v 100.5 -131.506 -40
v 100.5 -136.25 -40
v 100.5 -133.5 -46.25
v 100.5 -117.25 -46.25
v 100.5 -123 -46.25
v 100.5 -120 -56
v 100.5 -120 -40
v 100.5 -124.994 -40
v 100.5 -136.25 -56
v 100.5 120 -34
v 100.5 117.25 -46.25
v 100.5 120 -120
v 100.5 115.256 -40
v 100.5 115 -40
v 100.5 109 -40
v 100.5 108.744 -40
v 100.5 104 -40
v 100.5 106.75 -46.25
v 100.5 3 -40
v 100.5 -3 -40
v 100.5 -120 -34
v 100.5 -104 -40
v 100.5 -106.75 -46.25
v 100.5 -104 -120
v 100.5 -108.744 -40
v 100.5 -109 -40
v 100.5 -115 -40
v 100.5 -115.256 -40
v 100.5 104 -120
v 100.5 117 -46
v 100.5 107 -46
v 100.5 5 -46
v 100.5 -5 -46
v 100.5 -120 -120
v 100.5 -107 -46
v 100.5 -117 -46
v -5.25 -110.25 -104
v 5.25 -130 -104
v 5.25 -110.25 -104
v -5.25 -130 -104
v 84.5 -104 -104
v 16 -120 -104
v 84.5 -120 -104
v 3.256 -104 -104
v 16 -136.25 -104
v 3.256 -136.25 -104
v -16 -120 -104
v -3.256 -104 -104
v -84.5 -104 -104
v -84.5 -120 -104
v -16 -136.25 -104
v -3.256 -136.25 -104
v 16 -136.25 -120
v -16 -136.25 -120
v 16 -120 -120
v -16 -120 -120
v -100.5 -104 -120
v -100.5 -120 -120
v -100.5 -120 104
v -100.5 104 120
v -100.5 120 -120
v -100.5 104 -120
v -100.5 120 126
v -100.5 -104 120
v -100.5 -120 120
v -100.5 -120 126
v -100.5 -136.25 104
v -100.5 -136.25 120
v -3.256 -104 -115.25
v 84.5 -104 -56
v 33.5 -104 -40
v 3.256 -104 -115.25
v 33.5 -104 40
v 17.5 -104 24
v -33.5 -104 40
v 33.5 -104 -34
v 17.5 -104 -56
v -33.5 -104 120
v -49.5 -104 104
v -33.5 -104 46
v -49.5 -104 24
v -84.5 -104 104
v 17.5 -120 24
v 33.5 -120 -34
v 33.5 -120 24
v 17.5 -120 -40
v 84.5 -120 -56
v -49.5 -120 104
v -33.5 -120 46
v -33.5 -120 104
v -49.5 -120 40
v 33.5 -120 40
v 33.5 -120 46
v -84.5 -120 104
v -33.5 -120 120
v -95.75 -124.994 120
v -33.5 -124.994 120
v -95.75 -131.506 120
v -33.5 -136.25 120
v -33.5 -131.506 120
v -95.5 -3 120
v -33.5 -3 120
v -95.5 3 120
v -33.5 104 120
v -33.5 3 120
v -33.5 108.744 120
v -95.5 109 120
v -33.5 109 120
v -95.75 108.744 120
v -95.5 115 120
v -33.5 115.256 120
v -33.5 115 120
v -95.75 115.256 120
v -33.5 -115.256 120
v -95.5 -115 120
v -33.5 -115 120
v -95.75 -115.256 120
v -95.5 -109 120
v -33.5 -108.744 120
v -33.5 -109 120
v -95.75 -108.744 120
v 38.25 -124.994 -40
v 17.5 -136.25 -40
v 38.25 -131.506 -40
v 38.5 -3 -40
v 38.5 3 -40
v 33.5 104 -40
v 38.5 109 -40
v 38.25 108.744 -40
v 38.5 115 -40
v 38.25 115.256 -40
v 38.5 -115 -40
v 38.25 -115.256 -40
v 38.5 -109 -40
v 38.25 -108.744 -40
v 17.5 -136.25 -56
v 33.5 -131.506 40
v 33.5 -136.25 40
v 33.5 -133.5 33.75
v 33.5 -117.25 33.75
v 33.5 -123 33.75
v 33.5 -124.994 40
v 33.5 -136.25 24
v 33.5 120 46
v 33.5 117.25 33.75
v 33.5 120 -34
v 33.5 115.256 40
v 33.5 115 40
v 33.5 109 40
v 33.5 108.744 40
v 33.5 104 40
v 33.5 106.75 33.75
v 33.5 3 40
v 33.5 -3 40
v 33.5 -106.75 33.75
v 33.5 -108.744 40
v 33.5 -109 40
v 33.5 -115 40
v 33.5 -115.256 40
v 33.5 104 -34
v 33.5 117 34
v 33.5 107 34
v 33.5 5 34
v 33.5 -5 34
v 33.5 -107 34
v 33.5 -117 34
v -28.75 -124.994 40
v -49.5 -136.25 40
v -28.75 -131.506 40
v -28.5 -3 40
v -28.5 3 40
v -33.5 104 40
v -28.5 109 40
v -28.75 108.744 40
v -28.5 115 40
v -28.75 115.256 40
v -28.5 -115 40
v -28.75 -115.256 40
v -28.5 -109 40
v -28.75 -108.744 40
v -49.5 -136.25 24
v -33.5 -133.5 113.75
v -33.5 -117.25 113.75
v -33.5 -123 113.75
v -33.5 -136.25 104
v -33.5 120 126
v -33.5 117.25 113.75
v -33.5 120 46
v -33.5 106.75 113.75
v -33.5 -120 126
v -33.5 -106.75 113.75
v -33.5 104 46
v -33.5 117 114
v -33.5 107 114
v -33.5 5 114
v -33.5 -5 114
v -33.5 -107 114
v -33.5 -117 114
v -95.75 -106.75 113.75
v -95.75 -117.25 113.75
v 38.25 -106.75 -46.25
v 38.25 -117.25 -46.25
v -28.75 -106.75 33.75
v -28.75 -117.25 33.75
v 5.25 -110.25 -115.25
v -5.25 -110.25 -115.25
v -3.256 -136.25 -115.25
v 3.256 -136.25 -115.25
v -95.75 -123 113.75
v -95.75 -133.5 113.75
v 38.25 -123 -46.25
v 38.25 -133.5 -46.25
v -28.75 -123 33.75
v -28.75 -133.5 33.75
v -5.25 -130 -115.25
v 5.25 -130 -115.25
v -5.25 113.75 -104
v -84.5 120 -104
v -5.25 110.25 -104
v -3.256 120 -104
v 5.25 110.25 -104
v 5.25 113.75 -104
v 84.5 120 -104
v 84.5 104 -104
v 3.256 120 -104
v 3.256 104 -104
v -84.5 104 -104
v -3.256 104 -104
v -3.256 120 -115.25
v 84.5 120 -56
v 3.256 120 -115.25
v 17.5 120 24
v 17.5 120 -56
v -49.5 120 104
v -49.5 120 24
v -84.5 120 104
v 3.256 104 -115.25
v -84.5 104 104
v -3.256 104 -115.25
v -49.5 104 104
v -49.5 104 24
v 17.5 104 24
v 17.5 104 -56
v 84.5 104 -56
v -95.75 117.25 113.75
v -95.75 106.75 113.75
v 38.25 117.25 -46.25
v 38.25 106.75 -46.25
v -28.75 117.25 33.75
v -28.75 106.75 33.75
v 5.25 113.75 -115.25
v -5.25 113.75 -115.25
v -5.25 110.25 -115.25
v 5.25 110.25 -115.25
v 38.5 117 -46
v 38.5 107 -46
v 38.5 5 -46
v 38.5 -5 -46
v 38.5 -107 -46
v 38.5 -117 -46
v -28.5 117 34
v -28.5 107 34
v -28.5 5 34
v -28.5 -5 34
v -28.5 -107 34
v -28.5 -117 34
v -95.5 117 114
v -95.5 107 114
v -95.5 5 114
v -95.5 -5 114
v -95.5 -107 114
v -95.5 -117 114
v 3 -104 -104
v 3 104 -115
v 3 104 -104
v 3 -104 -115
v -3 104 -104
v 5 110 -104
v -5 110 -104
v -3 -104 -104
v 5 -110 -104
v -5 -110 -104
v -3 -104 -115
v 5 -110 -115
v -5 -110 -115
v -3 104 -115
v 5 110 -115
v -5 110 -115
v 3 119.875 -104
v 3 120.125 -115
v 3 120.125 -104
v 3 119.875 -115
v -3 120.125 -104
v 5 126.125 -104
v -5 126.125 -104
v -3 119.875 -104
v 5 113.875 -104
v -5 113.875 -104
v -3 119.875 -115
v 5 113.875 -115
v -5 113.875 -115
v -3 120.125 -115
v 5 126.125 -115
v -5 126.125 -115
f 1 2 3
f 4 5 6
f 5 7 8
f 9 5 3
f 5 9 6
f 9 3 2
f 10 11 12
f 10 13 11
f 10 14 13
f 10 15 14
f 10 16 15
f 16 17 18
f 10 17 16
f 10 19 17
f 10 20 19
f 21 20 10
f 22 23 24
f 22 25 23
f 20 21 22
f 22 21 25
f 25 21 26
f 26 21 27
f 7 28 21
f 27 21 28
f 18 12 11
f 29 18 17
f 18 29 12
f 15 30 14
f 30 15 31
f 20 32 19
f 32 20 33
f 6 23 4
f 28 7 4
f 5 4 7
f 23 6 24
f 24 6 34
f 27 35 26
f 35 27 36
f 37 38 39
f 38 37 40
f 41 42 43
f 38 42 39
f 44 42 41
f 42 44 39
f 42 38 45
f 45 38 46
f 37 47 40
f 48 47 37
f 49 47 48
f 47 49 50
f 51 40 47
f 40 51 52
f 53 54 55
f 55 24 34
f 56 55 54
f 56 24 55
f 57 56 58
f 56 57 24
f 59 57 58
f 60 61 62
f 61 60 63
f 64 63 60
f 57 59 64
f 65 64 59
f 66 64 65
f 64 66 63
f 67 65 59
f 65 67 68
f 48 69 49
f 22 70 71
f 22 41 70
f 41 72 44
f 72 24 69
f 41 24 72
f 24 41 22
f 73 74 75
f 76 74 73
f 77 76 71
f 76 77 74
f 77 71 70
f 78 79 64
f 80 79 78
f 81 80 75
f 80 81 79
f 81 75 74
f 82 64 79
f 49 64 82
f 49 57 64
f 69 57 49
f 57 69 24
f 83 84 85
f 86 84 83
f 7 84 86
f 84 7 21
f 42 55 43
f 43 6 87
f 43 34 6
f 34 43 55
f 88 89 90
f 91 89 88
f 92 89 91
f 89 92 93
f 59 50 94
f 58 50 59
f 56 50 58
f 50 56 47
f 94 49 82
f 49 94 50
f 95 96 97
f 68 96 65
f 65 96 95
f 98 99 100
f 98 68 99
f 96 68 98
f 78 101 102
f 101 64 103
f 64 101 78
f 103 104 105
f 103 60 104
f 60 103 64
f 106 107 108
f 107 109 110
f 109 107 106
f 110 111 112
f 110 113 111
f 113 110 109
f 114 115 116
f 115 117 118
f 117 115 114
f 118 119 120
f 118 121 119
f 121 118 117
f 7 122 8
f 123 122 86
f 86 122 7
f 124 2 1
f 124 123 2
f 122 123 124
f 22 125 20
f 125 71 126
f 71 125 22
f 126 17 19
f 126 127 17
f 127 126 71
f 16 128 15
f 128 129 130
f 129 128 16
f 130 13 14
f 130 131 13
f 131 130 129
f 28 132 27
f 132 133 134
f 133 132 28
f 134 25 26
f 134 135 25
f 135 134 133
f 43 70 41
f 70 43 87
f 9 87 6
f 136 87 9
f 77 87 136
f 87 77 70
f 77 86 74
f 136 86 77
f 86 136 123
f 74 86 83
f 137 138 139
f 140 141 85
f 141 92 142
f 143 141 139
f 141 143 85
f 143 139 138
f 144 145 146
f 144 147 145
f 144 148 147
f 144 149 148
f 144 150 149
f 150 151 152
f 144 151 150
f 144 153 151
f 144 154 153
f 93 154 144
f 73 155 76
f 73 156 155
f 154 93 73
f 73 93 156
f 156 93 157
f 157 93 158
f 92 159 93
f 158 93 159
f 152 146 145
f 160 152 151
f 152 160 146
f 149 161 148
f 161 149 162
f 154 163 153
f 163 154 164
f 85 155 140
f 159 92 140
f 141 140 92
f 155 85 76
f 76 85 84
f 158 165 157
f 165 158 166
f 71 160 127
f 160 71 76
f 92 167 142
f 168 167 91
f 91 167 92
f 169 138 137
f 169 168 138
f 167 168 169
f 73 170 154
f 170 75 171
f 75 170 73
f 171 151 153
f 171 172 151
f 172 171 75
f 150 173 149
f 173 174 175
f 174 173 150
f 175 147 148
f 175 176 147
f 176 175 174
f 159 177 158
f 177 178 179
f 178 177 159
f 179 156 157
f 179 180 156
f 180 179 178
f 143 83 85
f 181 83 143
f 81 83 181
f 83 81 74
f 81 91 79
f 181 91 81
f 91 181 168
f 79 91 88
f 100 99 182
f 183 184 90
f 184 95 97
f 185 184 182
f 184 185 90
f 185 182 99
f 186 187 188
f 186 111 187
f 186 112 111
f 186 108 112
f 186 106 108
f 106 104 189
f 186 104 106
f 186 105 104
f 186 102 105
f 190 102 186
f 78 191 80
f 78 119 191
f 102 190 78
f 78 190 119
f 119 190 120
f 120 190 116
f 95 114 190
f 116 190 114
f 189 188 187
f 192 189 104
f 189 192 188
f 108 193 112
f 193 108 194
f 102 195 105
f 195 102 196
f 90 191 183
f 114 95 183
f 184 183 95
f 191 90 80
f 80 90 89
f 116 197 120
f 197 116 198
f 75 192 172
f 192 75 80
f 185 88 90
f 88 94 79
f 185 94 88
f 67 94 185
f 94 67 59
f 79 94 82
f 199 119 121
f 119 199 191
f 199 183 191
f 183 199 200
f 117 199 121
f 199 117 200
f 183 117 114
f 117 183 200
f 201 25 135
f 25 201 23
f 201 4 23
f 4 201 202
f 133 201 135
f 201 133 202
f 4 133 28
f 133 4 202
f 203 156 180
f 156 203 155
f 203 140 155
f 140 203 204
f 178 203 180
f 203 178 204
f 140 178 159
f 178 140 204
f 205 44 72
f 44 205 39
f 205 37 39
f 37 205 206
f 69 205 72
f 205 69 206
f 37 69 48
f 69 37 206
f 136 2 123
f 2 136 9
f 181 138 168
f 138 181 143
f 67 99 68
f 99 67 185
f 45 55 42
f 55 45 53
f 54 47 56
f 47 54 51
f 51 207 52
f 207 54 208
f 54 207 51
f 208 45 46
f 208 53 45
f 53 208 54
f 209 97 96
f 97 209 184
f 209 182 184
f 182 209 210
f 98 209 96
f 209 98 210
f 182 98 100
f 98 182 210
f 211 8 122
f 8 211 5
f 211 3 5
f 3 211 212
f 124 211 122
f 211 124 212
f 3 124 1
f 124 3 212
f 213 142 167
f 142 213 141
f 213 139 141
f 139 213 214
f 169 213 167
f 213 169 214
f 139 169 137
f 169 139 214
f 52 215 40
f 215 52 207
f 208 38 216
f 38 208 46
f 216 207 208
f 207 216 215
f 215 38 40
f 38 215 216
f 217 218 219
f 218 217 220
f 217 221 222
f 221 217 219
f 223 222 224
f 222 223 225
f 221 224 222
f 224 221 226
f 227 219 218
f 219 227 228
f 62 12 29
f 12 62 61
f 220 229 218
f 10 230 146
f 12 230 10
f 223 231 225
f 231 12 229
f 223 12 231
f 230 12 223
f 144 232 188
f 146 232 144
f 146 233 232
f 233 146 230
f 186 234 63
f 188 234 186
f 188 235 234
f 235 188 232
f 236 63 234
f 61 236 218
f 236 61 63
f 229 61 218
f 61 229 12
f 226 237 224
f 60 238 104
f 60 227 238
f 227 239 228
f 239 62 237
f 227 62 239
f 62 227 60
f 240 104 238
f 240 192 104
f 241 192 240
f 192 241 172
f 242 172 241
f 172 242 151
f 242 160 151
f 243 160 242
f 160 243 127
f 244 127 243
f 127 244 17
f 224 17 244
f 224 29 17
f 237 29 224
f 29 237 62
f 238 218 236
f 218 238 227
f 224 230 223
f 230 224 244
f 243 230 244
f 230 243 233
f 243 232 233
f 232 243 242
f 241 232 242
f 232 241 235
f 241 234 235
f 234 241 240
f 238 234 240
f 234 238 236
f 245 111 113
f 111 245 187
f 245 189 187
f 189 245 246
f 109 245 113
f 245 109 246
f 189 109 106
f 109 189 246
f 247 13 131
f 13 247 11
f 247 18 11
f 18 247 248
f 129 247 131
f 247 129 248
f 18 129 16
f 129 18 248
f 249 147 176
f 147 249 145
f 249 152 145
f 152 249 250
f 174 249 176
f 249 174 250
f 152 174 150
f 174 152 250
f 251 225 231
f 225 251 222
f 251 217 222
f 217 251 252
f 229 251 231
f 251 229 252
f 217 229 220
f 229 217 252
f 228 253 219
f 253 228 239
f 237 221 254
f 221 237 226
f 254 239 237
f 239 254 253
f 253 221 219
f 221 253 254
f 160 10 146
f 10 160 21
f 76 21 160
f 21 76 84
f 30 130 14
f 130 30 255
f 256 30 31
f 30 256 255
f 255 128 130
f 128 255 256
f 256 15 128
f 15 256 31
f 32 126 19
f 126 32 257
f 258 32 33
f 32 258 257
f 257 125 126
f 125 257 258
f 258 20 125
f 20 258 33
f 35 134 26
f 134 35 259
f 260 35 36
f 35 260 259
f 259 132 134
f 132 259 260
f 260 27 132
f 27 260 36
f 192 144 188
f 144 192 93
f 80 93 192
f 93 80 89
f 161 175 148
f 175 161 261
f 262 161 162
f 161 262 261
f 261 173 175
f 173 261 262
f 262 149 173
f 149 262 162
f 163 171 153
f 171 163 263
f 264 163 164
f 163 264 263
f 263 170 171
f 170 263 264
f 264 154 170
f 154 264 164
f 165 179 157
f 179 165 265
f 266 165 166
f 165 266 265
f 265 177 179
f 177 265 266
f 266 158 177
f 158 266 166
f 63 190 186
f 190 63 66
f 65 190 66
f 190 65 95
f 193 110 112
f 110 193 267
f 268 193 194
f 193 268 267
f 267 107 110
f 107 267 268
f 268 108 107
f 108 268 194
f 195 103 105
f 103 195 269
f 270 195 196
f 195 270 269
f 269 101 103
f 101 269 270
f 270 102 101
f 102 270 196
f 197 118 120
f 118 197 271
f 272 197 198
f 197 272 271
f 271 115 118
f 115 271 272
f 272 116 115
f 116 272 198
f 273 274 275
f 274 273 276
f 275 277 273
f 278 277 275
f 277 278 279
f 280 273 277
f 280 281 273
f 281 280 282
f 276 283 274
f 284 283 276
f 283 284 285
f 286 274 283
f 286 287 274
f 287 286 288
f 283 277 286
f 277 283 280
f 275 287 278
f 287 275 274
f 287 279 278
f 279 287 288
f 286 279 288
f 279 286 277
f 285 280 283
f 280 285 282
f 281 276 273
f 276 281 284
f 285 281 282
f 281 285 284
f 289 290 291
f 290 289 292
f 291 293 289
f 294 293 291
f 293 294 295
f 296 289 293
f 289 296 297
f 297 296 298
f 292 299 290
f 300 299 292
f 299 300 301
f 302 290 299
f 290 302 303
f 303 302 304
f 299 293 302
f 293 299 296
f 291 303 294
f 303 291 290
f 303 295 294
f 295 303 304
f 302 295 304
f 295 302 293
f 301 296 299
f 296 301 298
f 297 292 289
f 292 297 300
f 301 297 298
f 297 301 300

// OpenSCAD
// file: wall.scad
include <common.scad>
include <config.scad>

wall_total_l = shelf_d * 3;
wall_total_h = shelf_h_sep * 3;

module wall_common()
{
	difference()
	{
		union()
		{
			/* main horizontal */
			translate([0, 0, -(wall_total_h / 2) + (wall_t / 2)])
				color(color_wall)
					cube([wall_total_l, wall_t, wall_t], center=true);

			/* main vertical */
			translate([-(wall_total_l / 2) + (wall_t / 2), 0, 0])
				color(color_wall)
					cube([wall_t, wall_t, wall_total_h], center=true);

			/* shelf 1 vertical */
			translate([(wall_total_l / 2) - (wall_t / 2), 0, -(shelf_h_sep)])
				color(color_wall)
					cube([wall_t, wall_t, shelf_h_sep], center=true);

			/* shelf 1 horizontal */
			translate([(wall_total_l / 2) - ((shelf_d + wall_t) / 2), 0, -(shelf_h_sep / 2) - (wall_t / 2)])
				color(color_wall)
					cube([shelf_d + wall_t, wall_t, wall_t], center=true);

			/* shelf 2 vertical */
			translate([(shelf_d / 2) - (wall_t / 2), 0, 0])
				color(color_wall)
					cube([wall_t, wall_t, shelf_h_sep], center=true);

			/* shelf 2 horizontal */
			translate([-(wall_t / 2), 0, (shelf_h_sep / 2) - (wall_t / 2)])
				color(color_wall)
					cube([shelf_d + wall_t, wall_t, wall_t], center=true);

			/* shelf 3 vertical */
			translate([-(shelf_d / 2) - (wall_t / 2), 0, +(shelf_h_sep)])
				color(color_wall)
					cube([wall_t, wall_t, shelf_h_sep], center=true);

			/* shelf 3 horizontal */
			translate([-shelf_d, 0, (wall_total_h / 2) - (wall_t / 2)])
				color(color_wall)
					cube([shelf_d, wall_t, wall_t], center=true);
		}

		/* Shelf 1 dovetail */
		translate([
			-(shelf_d / 2) + eps,
			0,
			(wall_total_h / 2) + eps
		])
			rotate([0, 0, 90])
				color(color_test)
					dovetail(
						length = shelf_dovetail_len + clearance + eps,
						depth = joint_depth + clearance + eps,
						neck = joint_neck + 2 * clearance,
						head = joint_head + 2 * clearance
					);

		/* Shelf 2 dovetail */
		translate([
			(shelf_d * 3 / 2) + eps,
			0,
			-(shelf_h_sep / 2) + eps
		])
			rotate([0, 0, 90])
				color(color_test)
					dovetail(
						length = shelf_dovetail_len + clearance + eps,
						depth = joint_depth + clearance + eps,
						neck = joint_neck + 2 * clearance,
						head = joint_head + 2 * clearance
					);

		/* Shelf 3 dovetail */
		translate([
			(shelf_d / 2) + eps,
			0,
			(shelf_h_sep / 2) + eps
		])
			rotate([0, 0, 90])
				color(color_test)
					dovetail(
						length = shelf_dovetail_len + clearance + eps,
						depth = joint_depth + clearance + eps,
						neck = joint_neck + 2 * clearance,
						head = joint_head + 2 * clearance
					);

		/* Base dovetail 1 */
		translate([
			0,
			(wall_t / 2) + eps,
			-(wall_total_h / 2) + wall_t + eps
		])
			rotate([270, 0, 0])
				color(color_test)
					dovetail(
						length = wall_dovetail_len + clearance + eps,
						depth = joint_depth + clearance + eps,
						neck = joint_neck + 2 * clearance,
						head = joint_head + 2 * clearance
					);
	}
}

module wall()
{
	difference()
	{
		/* Wall */
		wall_common();

		/* Base dovetail 2 */
		translate([
			0,
			-(wall_t / 2) - eps,
			-(wall_total_h / 2) + wall_t + eps
		])
			rotate([90, 180, 0])
				color(color_test)
					dovetail(
						length = wall_dovetail_len + clearance + eps,
						depth = joint_depth + clearance + eps,
						neck = joint_neck + 2 * clearance,
						head = joint_head + 2 * clearance
					);
	}
}


module wall_middle()
{
	shelf_y = -(wall_t + (clearance / 2));

	difference()
	{
		union()
		{
			wall_common();

			/* shelf 1 horizontal */
			translate([(wall_total_l / 2) - ((shelf_d + wall_t) / 2), shelf_y, -(shelf_h_sep / 2) - (wall_t / 2)])
				color(color_wall)
					cube([shelf_d + wall_t, wall_t + clearance, wall_t], center=true);

			/* shelf 2 horizontal */
			translate([-(wall_t / 2), shelf_y, (shelf_h_sep / 2) - (wall_t / 2)])
				color(color_wall)
					cube([shelf_d + wall_t, wall_t + clearance, wall_t], center=true);

			/* shelf 3 horizontal */
			translate([-shelf_d, shelf_y, (wall_total_h / 2) - (wall_t / 2)])
				color(color_wall)
					cube([shelf_d, wall_t + clearance, wall_t], center=true);

			/* Base 2 */
			translate([0, -wall_t, -(wall_total_h / 2) + (wall_t / 2)])
				color(color_wall)
					cube([wall_t * 2, wall_t + (clearance * 2), wall_t], center=true);
		}

		/* Shelf 1 dovetail */
		translate([
			-(shelf_d / 2) + eps,
			-(wall_t + clearance),
			(wall_total_h / 2) + eps
		])
			rotate([0, 0, 90])
				color(color_test)
					dovetail(
						length = shelf_dovetail_len + clearance + eps,
						depth = joint_depth + clearance + eps,
						neck = joint_neck + 2 * clearance,
						head = joint_head + 2 * clearance
					);

		/* Shelf 2 dovetail */
		translate([
			(shelf_d * 3 / 2) + eps,
			-(wall_t + clearance),
			-(shelf_h_sep / 2) + eps
		])
			rotate([0, 0, 90])
				color(color_test)
					dovetail(
						length = shelf_dovetail_len + clearance + eps,
						depth = joint_depth + clearance + eps,
						neck = joint_neck + 2 * clearance,
						head = joint_head + 2 * clearance
					);

		/* Shelf 3 dovetail */
		translate([
			(shelf_d / 2) + eps,
			-(wall_t + clearance),
			(shelf_h_sep / 2) + eps
		])
			rotate([0, 0, 90])
				color(color_test)
					dovetail(
						length = shelf_dovetail_len + clearance + eps,
						depth = joint_depth + clearance + eps,
						neck = joint_neck + 2 * clearance,
						head = joint_head + 2 * clearance
					);

		/* Base dovetail 2 */
		translate([
			0,
			-(wall_t + clearance) -(wall_t / 2) - eps,
			-(wall_total_h / 2) + wall_t + eps
		])
			rotate([90, 180, 0])
				color(color_test)
					dovetail(
						length = wall_dovetail_len + clearance + eps,
						depth = joint_depth + clearance + eps,
						neck = joint_neck + 2 * clearance,
						head = joint_head + 2 * clearance
					);
	}
}
// file: shelf.scad
include <common.scad>
include <config.scad>

module shelf()
{
	c_l = shelf_d;
	c_w = shelf_w;
	c_h = shelf_t;

	joint_x = shelf_w / 2 - wall_t / 2;
	joint_y = - shelf_d / 2;
	joint_z = - shelf_t / 2;

	union()
	{
		color(color_shelf)
			cube([c_l, c_w, c_h], center=true);

		color(color_dovetail)
			rotate([0, 0, 90])
				translate([joint_x, joint_y, joint_z])
					dovetail(
						length = shelf_dovetail_len,
						depth = joint_depth,
						neck = joint_neck,
						head = joint_head
					);

		color(color_dovetail)
			rotate([0, 0, 90])
				translate([0, joint_y, joint_z])
					dovetail(
						length = shelf_dovetail_len,
						depth = joint_depth,
						neck = joint_neck,
						head = joint_head
					);

		color(color_dovetail)
			rotate([0, 0, 90])
				translate([-joint_x, joint_y, joint_z])
					dovetail(
						length = shelf_dovetail_len,
						depth = joint_depth,
						neck = joint_neck,
						head = joint_head
					);
	}
}
// file: joint.scad
include <common.scad>
include <config.scad>

module joint_dovetail()
{
	rotate([90, 0, 0])
		translate([0, -(wall_dovetail_len / 2), (joint_depth / 2)])
			dovetail(
				length = wall_dovetail_len,
				depth = joint_depth,
				neck = joint_neck,
				head = joint_head
			);
}

module joint(joint_len)
{
	c_l = joint_neck;
	c_w = joint_len + eps;
	c_h = wall_dovetail_len;

	joint_x = 0;
	joint_y = (joint_len / 2) + (joint_depth / 2);
	joint_z = 0;

	union()
	{
		color(color_joint)
			cube([c_l, c_w, c_h], center=true);

		color(color_dovetail)
			translate([joint_x, joint_y, joint_z])
				rotate([0, 0, 0])
					joint_dovetail();

		color(color_dovetail)
			translate([-joint_x, -joint_y, joint_z])
				rotate([0, 0, 180])
					joint_dovetail();
	}
}

module joint_base()
{
	joint(shelf_w - (wall_t * 2));
}

module joint_modules()
{
	joint(clearance);
}
// file: config.scad
clearance = 0.25;
eps = 0.02;

color_dovetail = "red";
color_joint = "purple";
color_print = "white";
color_shelf = "green";
color_test = "black";
color_wall = "orange";

shelf_d = 67;
shelf_h_sep = 80;
shelf_t = 6;
shelf_w = 240;

wall_cut = 25;
wall_t = 16;

joint_depth = 6;
joint_neck = 6;
joint_head = 10;
back_stop = 5;

shelf_dovetail_len = shelf_d - back_stop;
wall_dovetail_len = wall_t - back_stop;
// file: common.scad
include <config.scad>

module dovetail(length,
	depth,
	neck,
	head)
{
	rotate([-90, 0, 0])
		linear_extrude(height = length, convexity = 10)
			polygon(points = [
				[-neck / 2, 0],
				[-head / 2, depth],
				[ head / 2, depth],
				[ neck / 2, 0]
			]);
}
// main file
include <common.scad>
include <config.scad>
include <joint.scad>
include <shelf.scad>
include <wall.scad>

/* assembly / joint_base / joint_modules / shelf / wall / wall_middle */
part = "assembly";

module assembly()
{
	union()
	{
		joint_z = -(shelf_h_sep * 3 / 2) + wall_t - (wall_dovetail_len / 2);
		wall_y = (shelf_w / 2) - (wall_t / 2);

		/* Left wall */
		translate([0, -wall_y, 0])
			color(color_wall)
				wall_middle();

		/* Right wall */
		translate([0, +wall_y, 0])
			color(color_wall)
				wall();

		/* Shelf 1 */
		translate([+shelf_d, 0, -(shelf_h_sep / 2) + (shelf_t / 2)])
			shelf();

		/* Shelf 2 */
		translate([0, 0, (shelf_h_sep / 2) + (shelf_t / 2)])
			shelf();

		/* Shelf 3 */
		translate([-shelf_d, 0, (shelf_h_sep * 3 / 2) + (shelf_t / 2)])
			shelf();

		/* Joint base */
		translate([0, 0, joint_z])
			joint_base();

		/* Joint modules */
		translate([0, (wall_total_h / 2), joint_z])
			joint_modules();
	}
}

if (part == "assembly")
{
	assembly();
}
else if (part == "joint_base")
{
	joint_base();
}
else if (part == "joint_modules")
{
	joint_modules();
}
else if (part == "shelf")
{
	shelf();
}
else if (part == "wall")
{
	wall();
}
else if (part == "wall_middle")
{
	wall_middle();
}
